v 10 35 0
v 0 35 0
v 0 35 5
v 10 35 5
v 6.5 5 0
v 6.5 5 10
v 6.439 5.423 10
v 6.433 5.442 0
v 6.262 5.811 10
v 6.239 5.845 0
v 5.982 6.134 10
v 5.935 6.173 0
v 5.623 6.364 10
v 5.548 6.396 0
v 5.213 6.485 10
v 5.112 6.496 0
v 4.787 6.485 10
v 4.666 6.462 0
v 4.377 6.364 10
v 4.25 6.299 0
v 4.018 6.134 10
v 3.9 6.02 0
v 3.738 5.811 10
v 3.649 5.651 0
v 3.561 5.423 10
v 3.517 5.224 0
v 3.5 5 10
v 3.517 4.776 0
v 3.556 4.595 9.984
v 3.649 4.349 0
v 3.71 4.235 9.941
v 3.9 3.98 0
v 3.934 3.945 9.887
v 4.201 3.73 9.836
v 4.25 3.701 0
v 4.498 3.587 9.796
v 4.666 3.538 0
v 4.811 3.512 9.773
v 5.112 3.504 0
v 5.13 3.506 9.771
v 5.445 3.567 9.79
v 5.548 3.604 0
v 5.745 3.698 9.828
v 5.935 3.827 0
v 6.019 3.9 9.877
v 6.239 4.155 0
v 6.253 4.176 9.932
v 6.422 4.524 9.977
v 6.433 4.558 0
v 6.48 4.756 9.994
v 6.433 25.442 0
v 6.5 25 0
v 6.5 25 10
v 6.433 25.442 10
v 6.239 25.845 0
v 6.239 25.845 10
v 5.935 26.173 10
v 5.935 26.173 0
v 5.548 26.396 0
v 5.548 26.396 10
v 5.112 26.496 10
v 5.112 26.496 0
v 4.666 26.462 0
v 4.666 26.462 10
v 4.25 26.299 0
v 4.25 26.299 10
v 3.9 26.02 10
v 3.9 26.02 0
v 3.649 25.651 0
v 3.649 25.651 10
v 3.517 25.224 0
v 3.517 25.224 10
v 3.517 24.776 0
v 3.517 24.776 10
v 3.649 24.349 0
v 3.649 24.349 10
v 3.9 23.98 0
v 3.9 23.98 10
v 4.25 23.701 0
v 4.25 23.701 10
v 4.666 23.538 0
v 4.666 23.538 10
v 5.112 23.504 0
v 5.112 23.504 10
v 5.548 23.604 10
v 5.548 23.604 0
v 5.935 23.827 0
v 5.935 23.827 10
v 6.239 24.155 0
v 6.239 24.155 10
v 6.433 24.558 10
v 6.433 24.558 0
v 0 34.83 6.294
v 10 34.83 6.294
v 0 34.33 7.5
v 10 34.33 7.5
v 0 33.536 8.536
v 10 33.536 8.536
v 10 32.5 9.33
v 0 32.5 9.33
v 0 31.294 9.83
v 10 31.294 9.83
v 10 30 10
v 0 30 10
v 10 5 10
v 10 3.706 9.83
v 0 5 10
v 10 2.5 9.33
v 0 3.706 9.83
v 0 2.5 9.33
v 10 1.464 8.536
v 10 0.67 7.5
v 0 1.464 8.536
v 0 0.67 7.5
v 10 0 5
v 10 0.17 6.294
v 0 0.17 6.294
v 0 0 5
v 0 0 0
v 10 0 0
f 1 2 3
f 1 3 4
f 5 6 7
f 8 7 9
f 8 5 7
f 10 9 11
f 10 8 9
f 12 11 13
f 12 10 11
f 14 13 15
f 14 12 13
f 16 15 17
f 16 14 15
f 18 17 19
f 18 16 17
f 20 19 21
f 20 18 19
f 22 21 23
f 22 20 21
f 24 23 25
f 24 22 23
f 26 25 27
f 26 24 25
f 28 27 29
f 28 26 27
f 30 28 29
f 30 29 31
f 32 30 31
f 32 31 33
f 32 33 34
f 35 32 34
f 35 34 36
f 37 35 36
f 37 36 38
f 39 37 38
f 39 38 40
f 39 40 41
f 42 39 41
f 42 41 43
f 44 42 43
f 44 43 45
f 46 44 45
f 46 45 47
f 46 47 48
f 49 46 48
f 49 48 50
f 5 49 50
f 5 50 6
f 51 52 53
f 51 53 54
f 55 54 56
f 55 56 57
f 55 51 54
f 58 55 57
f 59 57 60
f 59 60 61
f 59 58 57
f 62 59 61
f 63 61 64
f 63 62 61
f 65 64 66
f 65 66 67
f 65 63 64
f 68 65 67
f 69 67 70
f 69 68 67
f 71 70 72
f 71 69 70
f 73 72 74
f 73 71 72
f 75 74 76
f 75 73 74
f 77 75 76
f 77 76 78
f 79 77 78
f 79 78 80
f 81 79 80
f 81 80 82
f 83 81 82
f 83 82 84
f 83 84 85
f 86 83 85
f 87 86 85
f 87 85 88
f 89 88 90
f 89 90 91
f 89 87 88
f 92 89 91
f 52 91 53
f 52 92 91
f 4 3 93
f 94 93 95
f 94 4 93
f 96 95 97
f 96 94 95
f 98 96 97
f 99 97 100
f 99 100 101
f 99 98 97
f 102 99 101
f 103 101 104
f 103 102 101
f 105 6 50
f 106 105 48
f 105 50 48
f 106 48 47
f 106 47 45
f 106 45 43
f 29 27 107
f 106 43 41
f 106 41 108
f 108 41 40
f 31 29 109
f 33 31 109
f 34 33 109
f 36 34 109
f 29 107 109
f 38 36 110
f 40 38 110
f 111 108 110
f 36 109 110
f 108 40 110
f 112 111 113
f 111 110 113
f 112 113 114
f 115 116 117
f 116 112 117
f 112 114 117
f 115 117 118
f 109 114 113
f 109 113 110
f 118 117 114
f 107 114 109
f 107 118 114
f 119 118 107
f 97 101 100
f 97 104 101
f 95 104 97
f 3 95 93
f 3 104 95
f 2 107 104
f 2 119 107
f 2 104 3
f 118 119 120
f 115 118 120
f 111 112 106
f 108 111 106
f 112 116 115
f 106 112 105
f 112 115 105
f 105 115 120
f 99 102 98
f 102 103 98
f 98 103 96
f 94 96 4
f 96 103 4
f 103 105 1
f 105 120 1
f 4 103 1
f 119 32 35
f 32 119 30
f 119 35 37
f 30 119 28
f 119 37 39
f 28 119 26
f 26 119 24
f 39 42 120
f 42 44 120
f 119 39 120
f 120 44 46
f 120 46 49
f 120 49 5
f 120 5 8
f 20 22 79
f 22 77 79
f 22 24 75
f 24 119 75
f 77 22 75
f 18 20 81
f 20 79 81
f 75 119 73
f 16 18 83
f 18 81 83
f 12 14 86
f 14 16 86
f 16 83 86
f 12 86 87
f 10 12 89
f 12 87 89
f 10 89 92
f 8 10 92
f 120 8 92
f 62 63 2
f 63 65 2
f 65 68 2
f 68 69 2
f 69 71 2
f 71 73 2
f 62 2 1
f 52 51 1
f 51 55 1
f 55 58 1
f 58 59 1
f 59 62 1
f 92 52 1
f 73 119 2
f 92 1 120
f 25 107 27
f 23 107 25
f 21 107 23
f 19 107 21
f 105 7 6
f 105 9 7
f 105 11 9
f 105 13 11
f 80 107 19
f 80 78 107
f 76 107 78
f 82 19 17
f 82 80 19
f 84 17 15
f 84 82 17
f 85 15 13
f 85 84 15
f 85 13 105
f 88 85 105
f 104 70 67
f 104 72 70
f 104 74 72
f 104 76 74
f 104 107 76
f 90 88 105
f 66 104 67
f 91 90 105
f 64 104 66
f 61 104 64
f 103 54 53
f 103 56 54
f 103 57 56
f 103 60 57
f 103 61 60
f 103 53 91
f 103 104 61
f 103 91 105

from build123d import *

# Parameters (mm, degrees)
SKETCH1_W           = 10
SKETCH1_H           = 35
SKETCH1_R           = 1.5
BOSS_EXTRUDE1_DEPTH = 10
FILLET1_R           = 5
FILLET2_R           = 5


with BuildPart() as part:
    # Sketch1 → Boss-Extrude1 (new body)
    with BuildSketch(Plane.XY):
        with Locations((5, 17.5)):
            Rectangle(SKETCH1_W, SKETCH1_H)
        with Locations((5, 25)):
            Circle(SKETCH1_R, mode=Mode.SUBTRACT)
        with Locations((5, 5)):
            Circle(SKETCH1_R, mode=Mode.SUBTRACT)
    extrude(amount=BOSS_EXTRUDE1_DEPTH)

    # Fillet1
    # the kernel refuses this fillet: 5 mm, written as the material it takes off along each edge
    with BuildSketch(Plane(origin=(-12.5, 0, 10), x_dir=(0, 0, -1), z_dir=(1, 0, 0))) as fillet1_piece_1:
        with BuildLine():
            CenterArc((FILLET1_R, FILLET1_R), FILLET1_R, 180, 90)
            Line((0, FILLET1_R), (0, 0))
            Line((0, 0), (FILLET1_R, 0))
        make_face()
    extrude(amount=35, mode=Mode.SUBTRACT)

    # Fillet2
    fillet2_edges = [part.edges().sort_by_distance(p)[0] for p in [
        (5, 35, 10),
    ]]
    fillet(fillet2_edges, radius=FILLET2_R)


solid = part.part
